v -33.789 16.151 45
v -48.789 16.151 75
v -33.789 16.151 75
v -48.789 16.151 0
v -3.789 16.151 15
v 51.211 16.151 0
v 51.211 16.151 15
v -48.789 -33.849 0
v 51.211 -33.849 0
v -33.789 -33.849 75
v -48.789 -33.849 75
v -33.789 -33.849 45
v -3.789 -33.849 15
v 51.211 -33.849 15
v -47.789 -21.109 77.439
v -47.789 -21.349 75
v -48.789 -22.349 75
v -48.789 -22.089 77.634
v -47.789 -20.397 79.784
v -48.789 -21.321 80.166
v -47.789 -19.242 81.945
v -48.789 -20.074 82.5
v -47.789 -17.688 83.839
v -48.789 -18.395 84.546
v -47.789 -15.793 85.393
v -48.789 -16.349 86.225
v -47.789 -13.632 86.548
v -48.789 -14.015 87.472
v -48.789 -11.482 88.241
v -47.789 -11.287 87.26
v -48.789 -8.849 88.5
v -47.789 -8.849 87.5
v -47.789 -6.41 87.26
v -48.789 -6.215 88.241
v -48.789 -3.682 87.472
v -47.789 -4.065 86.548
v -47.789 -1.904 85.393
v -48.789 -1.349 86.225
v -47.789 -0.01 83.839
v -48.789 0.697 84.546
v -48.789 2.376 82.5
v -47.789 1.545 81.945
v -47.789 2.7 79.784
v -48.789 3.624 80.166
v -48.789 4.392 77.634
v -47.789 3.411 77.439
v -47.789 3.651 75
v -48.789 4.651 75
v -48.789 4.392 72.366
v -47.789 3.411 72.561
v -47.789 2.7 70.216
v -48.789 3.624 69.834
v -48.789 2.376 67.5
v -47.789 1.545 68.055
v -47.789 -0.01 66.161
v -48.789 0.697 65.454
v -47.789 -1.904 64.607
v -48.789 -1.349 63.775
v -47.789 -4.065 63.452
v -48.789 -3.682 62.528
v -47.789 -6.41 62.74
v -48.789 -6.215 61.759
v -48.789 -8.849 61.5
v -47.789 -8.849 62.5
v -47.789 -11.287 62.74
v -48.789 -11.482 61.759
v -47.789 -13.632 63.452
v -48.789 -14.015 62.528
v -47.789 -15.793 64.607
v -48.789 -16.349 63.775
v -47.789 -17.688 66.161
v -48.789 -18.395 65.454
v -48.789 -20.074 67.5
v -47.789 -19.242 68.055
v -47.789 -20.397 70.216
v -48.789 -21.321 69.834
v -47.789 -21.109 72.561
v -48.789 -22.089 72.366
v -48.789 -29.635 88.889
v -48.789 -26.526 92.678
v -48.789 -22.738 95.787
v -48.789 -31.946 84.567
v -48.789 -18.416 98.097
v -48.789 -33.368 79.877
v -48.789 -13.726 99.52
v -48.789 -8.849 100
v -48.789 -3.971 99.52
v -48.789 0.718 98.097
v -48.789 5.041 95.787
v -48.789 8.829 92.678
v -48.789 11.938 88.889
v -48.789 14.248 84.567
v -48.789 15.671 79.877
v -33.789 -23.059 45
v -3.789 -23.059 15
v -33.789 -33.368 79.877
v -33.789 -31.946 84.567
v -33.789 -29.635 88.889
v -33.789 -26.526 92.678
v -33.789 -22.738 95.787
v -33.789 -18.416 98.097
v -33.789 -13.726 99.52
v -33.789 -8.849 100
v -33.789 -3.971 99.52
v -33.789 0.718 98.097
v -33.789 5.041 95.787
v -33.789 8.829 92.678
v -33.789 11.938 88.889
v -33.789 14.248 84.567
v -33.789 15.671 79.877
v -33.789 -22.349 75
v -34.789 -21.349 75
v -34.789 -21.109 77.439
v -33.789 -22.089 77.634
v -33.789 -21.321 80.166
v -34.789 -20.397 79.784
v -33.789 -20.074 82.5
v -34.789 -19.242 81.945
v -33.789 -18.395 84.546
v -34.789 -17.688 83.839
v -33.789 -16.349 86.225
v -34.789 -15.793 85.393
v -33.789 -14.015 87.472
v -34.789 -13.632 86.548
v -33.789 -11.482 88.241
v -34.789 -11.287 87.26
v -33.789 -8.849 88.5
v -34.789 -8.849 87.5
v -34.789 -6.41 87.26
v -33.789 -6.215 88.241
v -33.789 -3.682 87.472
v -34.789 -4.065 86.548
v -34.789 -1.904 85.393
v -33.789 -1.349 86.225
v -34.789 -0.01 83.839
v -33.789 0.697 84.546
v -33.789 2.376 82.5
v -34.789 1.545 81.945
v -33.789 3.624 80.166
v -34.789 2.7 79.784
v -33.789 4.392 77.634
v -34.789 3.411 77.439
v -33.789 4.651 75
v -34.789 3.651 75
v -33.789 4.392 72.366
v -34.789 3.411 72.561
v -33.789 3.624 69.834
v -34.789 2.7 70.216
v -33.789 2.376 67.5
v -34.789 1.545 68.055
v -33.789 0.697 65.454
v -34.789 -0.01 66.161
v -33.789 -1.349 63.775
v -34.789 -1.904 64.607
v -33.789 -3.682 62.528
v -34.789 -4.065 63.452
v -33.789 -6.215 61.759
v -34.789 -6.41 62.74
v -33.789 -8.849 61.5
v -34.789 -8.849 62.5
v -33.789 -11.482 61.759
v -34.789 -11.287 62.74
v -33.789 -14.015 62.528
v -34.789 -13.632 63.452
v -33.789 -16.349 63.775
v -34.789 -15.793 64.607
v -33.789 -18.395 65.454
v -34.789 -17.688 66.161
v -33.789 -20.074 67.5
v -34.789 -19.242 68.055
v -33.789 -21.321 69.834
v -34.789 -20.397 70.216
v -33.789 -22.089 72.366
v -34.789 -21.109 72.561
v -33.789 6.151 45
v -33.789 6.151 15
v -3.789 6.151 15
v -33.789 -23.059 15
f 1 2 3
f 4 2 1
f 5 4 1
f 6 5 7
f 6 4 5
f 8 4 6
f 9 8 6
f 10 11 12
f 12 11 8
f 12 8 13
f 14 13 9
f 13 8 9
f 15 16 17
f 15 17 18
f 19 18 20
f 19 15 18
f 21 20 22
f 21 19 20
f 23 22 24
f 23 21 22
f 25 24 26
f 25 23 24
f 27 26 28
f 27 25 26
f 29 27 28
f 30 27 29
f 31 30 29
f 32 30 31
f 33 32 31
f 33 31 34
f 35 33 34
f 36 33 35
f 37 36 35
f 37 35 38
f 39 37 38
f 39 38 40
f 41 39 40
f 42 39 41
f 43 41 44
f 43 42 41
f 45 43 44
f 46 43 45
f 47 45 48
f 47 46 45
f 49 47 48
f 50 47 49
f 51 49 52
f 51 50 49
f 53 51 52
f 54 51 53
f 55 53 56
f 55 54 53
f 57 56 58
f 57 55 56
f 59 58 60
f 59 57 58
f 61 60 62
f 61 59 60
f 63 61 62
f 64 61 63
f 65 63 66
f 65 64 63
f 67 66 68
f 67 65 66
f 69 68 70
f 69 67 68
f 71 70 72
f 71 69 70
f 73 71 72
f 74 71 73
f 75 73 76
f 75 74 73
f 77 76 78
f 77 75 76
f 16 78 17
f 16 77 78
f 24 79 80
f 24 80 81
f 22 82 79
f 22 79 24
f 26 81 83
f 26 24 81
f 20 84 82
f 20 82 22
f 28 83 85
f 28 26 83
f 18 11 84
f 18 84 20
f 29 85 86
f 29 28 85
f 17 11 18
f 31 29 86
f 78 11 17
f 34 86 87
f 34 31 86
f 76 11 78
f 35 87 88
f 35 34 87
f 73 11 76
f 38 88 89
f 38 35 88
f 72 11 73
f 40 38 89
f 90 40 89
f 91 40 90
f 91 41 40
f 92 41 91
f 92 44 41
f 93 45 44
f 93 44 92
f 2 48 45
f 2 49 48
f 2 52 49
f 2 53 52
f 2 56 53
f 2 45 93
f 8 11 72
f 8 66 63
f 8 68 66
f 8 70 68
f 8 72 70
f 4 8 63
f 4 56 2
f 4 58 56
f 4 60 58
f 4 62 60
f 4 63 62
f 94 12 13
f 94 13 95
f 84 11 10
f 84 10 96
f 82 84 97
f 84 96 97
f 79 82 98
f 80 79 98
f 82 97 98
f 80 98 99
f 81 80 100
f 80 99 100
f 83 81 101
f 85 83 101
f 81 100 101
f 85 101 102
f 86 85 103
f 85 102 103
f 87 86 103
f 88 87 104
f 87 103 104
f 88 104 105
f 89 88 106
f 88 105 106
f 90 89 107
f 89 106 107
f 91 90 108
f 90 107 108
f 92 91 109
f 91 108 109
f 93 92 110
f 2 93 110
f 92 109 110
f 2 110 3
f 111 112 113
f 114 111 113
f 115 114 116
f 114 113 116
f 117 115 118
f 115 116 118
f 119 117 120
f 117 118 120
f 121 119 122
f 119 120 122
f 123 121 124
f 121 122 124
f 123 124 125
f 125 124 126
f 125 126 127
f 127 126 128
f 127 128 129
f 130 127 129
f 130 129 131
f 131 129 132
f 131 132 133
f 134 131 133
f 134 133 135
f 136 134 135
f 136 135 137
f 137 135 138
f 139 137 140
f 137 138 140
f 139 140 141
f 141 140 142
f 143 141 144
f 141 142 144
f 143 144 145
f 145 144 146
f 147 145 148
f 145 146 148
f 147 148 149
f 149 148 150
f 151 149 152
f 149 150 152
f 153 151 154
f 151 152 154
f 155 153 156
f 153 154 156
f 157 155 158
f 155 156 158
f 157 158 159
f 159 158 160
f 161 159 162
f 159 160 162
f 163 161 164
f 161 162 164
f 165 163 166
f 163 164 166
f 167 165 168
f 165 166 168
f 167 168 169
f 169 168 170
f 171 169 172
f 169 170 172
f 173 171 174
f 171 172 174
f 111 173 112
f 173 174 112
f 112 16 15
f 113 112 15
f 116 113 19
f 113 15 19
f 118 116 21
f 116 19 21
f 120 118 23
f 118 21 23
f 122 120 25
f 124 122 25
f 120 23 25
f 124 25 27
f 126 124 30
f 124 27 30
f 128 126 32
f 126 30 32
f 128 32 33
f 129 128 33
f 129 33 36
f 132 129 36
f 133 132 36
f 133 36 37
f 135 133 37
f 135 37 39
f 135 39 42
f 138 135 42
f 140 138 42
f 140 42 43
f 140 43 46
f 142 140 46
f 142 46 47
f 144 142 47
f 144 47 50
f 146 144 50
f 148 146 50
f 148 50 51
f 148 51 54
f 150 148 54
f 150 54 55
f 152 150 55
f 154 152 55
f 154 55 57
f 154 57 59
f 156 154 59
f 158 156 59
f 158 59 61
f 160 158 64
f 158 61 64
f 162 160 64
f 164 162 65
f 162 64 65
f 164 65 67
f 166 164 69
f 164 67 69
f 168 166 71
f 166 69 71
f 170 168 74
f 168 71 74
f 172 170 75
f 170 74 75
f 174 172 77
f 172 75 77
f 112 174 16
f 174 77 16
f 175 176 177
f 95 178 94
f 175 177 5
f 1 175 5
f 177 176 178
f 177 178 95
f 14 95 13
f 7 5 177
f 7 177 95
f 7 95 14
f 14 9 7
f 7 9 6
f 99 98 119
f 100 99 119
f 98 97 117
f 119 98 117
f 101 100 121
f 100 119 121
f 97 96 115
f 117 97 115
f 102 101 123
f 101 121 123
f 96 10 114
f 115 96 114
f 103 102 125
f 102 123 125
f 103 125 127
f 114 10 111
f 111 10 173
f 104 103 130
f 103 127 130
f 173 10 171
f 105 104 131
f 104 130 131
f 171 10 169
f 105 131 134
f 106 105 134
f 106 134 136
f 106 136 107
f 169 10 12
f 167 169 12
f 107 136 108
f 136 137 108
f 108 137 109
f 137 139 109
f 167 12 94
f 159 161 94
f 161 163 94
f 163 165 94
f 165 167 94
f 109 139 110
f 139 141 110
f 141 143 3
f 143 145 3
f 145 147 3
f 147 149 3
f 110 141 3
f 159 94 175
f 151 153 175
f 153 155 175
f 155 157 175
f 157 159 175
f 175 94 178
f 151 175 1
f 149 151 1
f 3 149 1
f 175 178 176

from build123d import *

# Parameters (mm, degrees)
F0_W     = 100
F0_H     = 50
F1_DEPTH = 15
F2_W     = 15
F2_H     = 50
F3_DEPTH = 85
F4_W     = 30
F4_H     = 10.7893505692
F4_H_2   = 10
F5_DEPTH = 30
F6_SIZE  = 29.99999
F7_R     = 12.5
F8_R     = 12.5
F9_DEPTH = 25
F10_R    = 24.99999
F11_SIZE = 1


# Not quite as in the source:
# - a fillet or chamfer is up to 0.001 mm smaller than in the source, because OpenCascade refuses the exact size


with BuildPart() as f1:
    # F0 (on Top) → F1 (new body)
    with BuildSketch(Plane.XY):
        with Locations((1.2109465897, -8.8487002536)):
            Rectangle(F0_W, F0_H)
    extrude(amount=F1_DEPTH)

    # F2 (on face) → F3 (join)
    with BuildSketch(Plane.XY.offset(15)):
        with Locations((-41.2890534103, -8.8487002536)):
            Rectangle(F2_W, F2_H)
    extrude(amount=F3_DEPTH)

    # F4 (on face) → F5 (join)
    with BuildSketch(Plane.XY.offset(15)):
        with Locations((-18.7890534103, -28.454024969)):
            Rectangle(F4_W, F4_H)
        with Locations((-18.7890534103, 11.1512997464)):
            Rectangle(F4_W, F4_H_2)
    extrude(amount=F5_DEPTH)

    # F6 (size 30 in the source; OpenCascade refuses exactly that, so slightly less here)
    f6_edges = [f1.edges().sort_by_distance(p)[0] for p in [
        (-3.789053, 11.1513, 45),
        (-3.789053, -28.454025, 45),
    ]]
    chamfer(f6_edges, length=F6_SIZE)

    # F7 (on face) + F8 (on face) → F9 (cut)
    with BuildSketch(Plane(origin=(-48.7890534103, 0, 0), x_dir=(0, -1, 0), z_dir=(-1, 0, 0))):
        with Locations((8.8487002536, 75)):
            Circle(F7_R)
    with BuildSketch(Plane(origin=(-48.7890534103, 0, 0), x_dir=(0, -1, 0), z_dir=(-1, 0, 0))):
        with Locations((8.8487002536, 75)):
            Circle(F8_R)
    extrude(amount=-F9_DEPTH, mode=Mode.SUBTRACT)

    # F10 (radius 25 in the source; OpenCascade refuses exactly that, so slightly less here)
    f10_edges = [f1.edges().sort_by_distance(p)[0] for p in [
        (-41.289053, 16.1513, 100),
        (-41.289053, -33.8487, 100),
    ]]
    fillet(f10_edges, radius=F10_R)

    # F11
    f11_edges = [f1.edges().sort_by_distance(p)[0] for p in [
        (-33.789053, 3.6513, 75),
        (-48.789053, 3.6513, 75),
    ]]
    chamfer(f11_edges, length=F11_SIZE)


solid = f1.part
